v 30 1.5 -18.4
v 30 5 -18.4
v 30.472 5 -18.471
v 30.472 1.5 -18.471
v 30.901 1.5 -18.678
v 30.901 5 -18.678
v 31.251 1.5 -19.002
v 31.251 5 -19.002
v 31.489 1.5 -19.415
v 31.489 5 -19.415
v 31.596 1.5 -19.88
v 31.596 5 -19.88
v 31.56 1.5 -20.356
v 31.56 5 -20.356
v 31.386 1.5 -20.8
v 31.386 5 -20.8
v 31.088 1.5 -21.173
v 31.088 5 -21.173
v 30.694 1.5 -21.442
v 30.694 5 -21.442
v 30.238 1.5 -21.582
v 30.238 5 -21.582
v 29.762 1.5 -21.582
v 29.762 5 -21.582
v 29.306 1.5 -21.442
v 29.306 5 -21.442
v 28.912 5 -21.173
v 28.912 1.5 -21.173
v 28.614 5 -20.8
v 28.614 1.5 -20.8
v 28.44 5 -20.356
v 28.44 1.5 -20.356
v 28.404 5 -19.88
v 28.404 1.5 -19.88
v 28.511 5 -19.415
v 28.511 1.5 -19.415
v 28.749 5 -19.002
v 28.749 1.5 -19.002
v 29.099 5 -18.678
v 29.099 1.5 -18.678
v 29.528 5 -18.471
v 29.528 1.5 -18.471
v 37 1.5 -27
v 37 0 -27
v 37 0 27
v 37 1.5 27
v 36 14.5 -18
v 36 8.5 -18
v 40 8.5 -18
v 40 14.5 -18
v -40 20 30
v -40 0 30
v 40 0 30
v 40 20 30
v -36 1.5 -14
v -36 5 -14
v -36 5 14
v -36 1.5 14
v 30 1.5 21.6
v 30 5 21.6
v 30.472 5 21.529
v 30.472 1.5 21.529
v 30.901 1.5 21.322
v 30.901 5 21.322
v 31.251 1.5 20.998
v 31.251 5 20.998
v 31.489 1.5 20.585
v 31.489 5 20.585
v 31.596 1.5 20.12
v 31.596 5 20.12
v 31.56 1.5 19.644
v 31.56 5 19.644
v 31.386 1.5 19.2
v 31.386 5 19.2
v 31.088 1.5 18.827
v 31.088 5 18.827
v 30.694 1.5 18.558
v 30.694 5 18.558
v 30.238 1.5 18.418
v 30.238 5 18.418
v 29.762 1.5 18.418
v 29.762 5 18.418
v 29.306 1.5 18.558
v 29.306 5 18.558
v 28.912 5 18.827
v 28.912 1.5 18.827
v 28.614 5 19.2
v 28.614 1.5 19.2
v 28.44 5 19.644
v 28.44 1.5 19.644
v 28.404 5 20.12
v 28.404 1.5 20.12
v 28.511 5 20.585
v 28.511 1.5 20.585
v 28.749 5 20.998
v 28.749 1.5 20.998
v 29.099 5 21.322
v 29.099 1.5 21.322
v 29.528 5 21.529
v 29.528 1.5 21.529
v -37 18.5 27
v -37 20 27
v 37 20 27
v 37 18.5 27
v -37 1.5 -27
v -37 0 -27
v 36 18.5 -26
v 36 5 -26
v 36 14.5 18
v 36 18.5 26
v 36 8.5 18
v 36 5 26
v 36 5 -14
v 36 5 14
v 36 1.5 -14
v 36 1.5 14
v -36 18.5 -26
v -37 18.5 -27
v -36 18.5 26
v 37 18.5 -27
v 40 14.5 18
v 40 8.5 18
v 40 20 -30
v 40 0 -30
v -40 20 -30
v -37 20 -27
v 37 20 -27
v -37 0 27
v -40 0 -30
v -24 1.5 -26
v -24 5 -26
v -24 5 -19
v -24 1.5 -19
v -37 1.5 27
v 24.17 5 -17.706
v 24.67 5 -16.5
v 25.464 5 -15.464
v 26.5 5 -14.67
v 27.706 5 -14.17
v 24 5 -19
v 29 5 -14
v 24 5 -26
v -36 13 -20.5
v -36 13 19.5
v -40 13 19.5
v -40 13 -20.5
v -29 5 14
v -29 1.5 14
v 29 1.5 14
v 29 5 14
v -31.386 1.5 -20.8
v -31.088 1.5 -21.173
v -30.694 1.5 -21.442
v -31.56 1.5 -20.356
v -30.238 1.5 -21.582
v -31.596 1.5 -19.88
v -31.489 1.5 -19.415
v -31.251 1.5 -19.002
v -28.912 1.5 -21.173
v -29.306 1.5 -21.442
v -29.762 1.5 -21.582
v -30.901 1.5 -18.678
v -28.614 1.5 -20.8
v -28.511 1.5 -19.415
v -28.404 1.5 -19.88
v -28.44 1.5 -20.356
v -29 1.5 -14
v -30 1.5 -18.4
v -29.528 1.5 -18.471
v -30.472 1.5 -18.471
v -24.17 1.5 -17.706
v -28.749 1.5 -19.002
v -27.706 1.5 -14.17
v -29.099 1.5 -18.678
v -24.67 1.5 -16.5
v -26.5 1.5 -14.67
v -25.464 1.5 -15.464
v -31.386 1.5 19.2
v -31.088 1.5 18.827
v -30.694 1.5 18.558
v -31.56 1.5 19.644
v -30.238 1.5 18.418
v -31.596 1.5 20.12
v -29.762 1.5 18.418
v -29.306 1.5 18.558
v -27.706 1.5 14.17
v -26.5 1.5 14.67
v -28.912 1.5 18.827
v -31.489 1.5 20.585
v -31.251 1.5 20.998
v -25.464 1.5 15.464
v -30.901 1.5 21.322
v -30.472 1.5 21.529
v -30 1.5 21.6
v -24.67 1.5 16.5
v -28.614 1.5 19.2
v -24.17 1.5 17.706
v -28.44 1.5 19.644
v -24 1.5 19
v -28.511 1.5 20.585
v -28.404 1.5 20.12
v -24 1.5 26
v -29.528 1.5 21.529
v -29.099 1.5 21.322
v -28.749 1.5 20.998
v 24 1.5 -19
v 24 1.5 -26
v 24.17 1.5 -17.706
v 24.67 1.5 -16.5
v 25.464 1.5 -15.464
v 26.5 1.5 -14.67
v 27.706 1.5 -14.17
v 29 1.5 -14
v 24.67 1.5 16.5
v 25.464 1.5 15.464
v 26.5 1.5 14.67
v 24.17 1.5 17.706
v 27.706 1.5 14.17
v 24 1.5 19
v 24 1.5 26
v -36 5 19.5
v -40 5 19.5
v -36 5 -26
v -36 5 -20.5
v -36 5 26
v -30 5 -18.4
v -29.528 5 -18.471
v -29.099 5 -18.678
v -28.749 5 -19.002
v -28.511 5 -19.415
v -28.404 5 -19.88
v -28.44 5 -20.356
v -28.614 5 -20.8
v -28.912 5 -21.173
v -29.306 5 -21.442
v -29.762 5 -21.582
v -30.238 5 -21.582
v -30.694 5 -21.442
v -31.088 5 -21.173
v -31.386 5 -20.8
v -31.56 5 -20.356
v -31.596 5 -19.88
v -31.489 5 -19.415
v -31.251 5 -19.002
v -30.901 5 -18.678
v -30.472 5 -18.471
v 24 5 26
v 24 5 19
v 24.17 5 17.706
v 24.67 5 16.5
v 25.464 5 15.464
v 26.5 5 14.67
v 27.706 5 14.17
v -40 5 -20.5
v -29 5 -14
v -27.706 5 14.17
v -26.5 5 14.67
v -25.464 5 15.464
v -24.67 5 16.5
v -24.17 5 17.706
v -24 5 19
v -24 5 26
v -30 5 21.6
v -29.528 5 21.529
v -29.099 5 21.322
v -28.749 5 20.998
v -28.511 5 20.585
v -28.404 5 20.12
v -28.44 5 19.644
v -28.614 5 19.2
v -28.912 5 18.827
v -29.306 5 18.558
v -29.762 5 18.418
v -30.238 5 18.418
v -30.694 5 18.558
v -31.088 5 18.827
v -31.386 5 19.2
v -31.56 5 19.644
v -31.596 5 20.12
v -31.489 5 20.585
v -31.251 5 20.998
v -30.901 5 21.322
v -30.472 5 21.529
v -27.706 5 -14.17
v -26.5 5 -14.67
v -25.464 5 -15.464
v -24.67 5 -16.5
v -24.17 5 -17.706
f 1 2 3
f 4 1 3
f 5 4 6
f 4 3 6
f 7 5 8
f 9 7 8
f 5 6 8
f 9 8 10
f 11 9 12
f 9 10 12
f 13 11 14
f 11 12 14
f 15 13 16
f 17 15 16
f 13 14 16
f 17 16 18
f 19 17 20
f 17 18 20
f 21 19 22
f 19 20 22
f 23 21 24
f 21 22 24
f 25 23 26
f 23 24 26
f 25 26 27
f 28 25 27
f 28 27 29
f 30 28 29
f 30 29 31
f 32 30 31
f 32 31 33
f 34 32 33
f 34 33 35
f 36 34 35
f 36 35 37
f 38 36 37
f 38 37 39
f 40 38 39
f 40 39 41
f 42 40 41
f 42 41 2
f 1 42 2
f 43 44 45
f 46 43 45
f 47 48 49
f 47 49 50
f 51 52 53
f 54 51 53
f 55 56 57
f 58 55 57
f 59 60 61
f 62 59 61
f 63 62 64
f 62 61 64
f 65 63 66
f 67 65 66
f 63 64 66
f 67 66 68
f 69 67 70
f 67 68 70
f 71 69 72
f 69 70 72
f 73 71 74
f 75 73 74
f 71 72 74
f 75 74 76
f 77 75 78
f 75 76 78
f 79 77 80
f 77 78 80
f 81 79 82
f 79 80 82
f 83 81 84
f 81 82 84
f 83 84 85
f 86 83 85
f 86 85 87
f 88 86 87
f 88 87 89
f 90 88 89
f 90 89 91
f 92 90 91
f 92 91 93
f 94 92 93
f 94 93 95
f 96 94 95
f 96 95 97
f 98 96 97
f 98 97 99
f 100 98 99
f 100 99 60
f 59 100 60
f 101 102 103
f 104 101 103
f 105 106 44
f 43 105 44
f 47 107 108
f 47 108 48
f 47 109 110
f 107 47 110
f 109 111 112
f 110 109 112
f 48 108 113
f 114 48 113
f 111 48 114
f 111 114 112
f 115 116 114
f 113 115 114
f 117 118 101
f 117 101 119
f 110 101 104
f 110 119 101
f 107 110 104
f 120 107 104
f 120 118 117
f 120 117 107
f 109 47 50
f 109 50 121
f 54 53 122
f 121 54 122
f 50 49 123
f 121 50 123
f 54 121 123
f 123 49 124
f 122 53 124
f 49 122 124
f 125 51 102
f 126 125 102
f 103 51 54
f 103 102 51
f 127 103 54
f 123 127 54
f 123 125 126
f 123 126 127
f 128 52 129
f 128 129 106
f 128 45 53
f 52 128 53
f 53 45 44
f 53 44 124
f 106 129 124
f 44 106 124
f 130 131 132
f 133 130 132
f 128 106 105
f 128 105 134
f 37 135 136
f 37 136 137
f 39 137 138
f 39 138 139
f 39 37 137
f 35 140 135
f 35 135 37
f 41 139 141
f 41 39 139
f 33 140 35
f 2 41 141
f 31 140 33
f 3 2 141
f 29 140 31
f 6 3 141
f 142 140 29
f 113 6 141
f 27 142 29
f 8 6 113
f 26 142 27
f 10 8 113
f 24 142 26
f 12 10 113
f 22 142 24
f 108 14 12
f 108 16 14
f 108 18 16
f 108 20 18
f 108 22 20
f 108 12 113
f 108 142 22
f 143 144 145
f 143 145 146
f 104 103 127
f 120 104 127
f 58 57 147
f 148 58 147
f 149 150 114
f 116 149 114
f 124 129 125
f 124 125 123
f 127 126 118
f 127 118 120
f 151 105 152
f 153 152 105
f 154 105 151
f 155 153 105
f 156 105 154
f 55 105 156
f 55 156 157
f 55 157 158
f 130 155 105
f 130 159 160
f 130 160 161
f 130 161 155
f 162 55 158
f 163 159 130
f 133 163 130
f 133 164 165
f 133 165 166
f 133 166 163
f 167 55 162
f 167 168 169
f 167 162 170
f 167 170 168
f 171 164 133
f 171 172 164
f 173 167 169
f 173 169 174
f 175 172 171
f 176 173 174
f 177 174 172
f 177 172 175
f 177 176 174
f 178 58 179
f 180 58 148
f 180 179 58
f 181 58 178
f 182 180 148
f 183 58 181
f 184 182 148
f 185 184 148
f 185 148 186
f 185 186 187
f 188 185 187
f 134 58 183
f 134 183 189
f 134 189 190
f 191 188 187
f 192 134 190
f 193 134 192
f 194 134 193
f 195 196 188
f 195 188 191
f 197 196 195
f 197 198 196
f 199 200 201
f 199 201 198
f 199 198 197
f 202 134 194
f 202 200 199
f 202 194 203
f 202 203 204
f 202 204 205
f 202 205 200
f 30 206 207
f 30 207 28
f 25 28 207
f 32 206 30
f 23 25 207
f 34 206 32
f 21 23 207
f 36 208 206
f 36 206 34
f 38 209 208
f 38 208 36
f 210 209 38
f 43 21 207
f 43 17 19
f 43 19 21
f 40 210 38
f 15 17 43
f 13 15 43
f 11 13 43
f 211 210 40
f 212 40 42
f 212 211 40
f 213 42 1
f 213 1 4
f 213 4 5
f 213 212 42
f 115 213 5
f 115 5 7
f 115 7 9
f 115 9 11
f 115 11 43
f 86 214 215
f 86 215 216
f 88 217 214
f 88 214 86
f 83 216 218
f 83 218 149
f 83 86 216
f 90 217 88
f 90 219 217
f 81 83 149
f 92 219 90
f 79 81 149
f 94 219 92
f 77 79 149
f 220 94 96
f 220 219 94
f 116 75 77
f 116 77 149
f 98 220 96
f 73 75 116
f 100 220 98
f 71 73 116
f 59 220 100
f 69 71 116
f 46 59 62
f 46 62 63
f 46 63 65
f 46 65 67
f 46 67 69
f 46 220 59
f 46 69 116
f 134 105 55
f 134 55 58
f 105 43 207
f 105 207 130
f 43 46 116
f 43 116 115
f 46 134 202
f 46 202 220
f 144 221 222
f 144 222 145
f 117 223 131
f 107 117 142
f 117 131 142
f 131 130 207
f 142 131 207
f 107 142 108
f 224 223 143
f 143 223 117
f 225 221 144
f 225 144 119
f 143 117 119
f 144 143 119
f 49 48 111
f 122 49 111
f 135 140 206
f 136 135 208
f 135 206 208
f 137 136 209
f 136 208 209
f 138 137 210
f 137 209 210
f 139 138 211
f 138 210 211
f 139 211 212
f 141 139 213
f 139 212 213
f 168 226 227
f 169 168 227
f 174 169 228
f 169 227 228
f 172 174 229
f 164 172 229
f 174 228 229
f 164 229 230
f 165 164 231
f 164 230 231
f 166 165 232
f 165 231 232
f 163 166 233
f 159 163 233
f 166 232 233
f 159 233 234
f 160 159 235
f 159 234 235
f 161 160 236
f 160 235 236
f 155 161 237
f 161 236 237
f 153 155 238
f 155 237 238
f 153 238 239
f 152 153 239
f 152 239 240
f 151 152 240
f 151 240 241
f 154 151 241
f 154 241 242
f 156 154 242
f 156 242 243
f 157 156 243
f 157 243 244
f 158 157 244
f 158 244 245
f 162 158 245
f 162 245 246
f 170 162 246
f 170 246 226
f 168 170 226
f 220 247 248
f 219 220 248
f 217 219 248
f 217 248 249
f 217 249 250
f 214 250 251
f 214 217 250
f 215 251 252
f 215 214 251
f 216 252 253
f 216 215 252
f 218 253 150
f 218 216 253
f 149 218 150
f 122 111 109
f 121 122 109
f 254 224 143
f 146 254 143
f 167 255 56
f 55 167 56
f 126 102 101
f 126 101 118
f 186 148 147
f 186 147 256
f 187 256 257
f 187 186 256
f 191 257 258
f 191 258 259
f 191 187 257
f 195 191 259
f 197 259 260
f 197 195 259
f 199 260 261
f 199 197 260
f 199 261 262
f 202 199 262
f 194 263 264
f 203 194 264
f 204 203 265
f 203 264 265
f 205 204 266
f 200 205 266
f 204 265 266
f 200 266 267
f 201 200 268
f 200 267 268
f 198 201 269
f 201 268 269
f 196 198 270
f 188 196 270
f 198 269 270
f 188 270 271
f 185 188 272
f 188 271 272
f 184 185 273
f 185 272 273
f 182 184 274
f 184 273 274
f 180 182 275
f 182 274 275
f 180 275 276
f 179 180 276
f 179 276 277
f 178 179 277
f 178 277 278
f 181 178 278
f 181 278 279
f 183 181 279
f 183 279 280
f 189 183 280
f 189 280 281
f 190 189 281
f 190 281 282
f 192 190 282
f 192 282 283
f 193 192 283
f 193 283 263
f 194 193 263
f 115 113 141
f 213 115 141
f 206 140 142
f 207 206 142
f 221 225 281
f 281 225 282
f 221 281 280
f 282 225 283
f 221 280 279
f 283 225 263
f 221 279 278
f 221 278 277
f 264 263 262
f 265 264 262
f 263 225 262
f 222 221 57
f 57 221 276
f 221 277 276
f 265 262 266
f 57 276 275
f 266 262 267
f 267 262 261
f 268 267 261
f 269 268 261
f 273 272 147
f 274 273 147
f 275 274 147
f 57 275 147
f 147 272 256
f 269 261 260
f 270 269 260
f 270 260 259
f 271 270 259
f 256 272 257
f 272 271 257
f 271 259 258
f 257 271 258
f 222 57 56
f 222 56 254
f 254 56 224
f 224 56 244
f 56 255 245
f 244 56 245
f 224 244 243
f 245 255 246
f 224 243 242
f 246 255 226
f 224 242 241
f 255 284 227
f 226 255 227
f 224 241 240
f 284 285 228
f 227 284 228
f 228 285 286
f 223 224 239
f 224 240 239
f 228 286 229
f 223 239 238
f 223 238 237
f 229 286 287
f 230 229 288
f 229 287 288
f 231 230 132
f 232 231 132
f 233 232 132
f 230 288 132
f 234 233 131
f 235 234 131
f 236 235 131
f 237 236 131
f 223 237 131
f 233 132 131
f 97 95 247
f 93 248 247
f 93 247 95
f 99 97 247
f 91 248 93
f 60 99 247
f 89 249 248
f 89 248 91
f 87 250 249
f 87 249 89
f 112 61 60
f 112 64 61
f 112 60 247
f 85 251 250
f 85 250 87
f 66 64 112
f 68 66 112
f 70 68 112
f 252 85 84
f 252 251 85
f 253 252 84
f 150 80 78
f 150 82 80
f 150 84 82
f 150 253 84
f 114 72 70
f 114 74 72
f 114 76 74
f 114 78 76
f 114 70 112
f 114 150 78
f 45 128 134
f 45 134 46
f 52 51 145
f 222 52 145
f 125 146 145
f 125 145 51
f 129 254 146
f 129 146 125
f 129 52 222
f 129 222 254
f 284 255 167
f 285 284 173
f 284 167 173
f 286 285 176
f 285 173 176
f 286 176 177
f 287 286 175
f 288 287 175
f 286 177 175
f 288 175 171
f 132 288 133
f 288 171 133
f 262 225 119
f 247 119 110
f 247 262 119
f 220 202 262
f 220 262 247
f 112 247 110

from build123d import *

# Parameters (mm, degrees)
SKETCH_1_W                  = 80
SKETCH_1_H                  = 60
EXTRUDE_1_DEPTH             = 20
SKETCH_2_W                  = 72
SKETCH_2_H                  = 52
CUT_EXTRUDE_1_DEPTH         = 15
CUT_EXTRUDE_2_DEPTH         = 53.201532545
SKETCH_4_R                  = 1.6
CUT_EXTRUDE_3_DEPTH         = 53.201532545
PATTERN_LINEAR_1_COUNT      = 2
PATTERN_LINEAR_1_PITCH      = 60
PATTERN_LINEAR_1_COUNT_DIR2 = 2
PATTERN_LINEAR_1_PITCH_DIR2 = 40
FILLET_1_R                  = 5
SKETCH_5_W                  = 72
SKETCH_5_H                  = 52
CUT_EXTRUDE_4_DEPTH         = 1.5
SKETCH_6_W                  = 40
SKETCH_6_H                  = 8
CUT_EXTRUDE_7_DEPTH         = 85.118963379
SKETCH_7_W                  = 36
SKETCH_7_H                  = 6
CUT_EXTRUDE_8_DEPTH         = 85.118963379
SKETCH_8_W                  = 74
SKETCH_8_H                  = 54
CUT_EXTRUDE_9_DEPTH         = 1.5
SKETCH_9_W                  = 74
SKETCH_9_H                  = 54
CUT_EXTRUDE_10_DEPTH        = 1.5


with BuildPart() as part:
    # 草图1 → 凸台-拉伸1 (new body)
    with BuildSketch(Plane(origin=(0, 0, 0), x_dir=(1, 0, 0), z_dir=(0, 1, 0))):
        Rectangle(SKETCH_1_W, SKETCH_1_H)
    extrude(amount=EXTRUDE_1_DEPTH)

    # 草图2 → 切除-拉伸1 (cut)
    with BuildSketch(Plane(origin=(0, 20, 0), x_dir=(1, 0, 0), z_dir=(0, 1, 0))):
        Rectangle(SKETCH_2_W, SKETCH_2_H)
    extrude(amount=-CUT_EXTRUDE_1_DEPTH, mode=Mode.SUBTRACT)

    # 草图3 → 切除-拉伸2 (cut, through all)
    with BuildSketch(Plane(origin=(0, 5, 0), x_dir=(1, 0, 0), z_dir=(0, 1, 0))):
        Polygon((-24, 14), (-36, 14), (-36, -14), (-24, -14), (-24, -26), (24, -26), (24, -14), (36, -14), (36, 14), (24, 14), (24, 26), (-24, 26), align=None)
    extrude(amount=-CUT_EXTRUDE_2_DEPTH, mode=Mode.SUBTRACT)

    # 草图4 → 切除-拉伸3 (cut, through all)
    with BuildSketch(Plane(origin=(0, 5, 0), x_dir=(1, 0, 0), z_dir=(0, 1, 0))):
        with Locations(Location((-30, 20, 0), (0, 0, 270))):
            Circle(SKETCH_4_R)
    cut_extrude_3 = extrude(amount=-CUT_EXTRUDE_3_DEPTH, mode=Mode.SUBTRACT)

    # 阵列(线性)1: Cut-Extrude 3 2 × 2
    with Locations(*[(i * PATTERN_LINEAR_1_PITCH, 0, j * PATTERN_LINEAR_1_PITCH_DIR2) for i in range(PATTERN_LINEAR_1_COUNT) for j in range(PATTERN_LINEAR_1_COUNT_DIR2) if (i, j) != (0, 0)]):
        add(cut_extrude_3, mode=Mode.SUBTRACT)

    # 圆角1
    fillet_1_edges = [part.edges().sort_by_distance(p)[0] for p in [
        (-24, 2.5, -14),
        (24, 2.5, -14),
        (24, 2.5, 14),
        (-24, 2.5, 14),
    ]]
    fillet(fillet_1_edges, radius=FILLET_1_R)

    # 草图5 → 切除-拉伸4 (cut)
    with BuildSketch(Plane.XZ):
        Rectangle(SKETCH_5_W, SKETCH_5_H)
    extrude(amount=-CUT_EXTRUDE_4_DEPTH, mode=Mode.SUBTRACT)

    # 草图6 → 切除-拉伸7 (cut, through all)
    with BuildSketch(Plane(origin=(-36, 0, 0), x_dir=(0, 0, -1), z_dir=(1, 0, 0))):
        with Locations((0.5, 9)):
            Rectangle(SKETCH_6_W, SKETCH_6_H)
    extrude(amount=-CUT_EXTRUDE_7_DEPTH, mode=Mode.SUBTRACT)

    # 草图7 → 切除-拉伸8 (cut, through all)
    with BuildSketch(Plane.ZY.offset(-36)):
        with Locations((0, 11.5)):
            Rectangle(SKETCH_7_W, SKETCH_7_H)
    extrude(amount=-CUT_EXTRUDE_8_DEPTH, mode=Mode.SUBTRACT)

    # 草图8 → 切除-拉伸9 (cut)
    with BuildSketch(Plane(origin=(0, 20, 0), x_dir=(1, 0, 0), z_dir=(0, 1, 0))):
        Rectangle(SKETCH_8_W, SKETCH_8_H)
    extrude(amount=-CUT_EXTRUDE_9_DEPTH, mode=Mode.SUBTRACT)

    # 草图9 → 切除-拉伸10 (cut)
    with BuildSketch(Plane.XZ):
        Rectangle(SKETCH_9_W, SKETCH_9_H)
    extrude(amount=-CUT_EXTRUDE_10_DEPTH, mode=Mode.SUBTRACT)


solid = part.part
